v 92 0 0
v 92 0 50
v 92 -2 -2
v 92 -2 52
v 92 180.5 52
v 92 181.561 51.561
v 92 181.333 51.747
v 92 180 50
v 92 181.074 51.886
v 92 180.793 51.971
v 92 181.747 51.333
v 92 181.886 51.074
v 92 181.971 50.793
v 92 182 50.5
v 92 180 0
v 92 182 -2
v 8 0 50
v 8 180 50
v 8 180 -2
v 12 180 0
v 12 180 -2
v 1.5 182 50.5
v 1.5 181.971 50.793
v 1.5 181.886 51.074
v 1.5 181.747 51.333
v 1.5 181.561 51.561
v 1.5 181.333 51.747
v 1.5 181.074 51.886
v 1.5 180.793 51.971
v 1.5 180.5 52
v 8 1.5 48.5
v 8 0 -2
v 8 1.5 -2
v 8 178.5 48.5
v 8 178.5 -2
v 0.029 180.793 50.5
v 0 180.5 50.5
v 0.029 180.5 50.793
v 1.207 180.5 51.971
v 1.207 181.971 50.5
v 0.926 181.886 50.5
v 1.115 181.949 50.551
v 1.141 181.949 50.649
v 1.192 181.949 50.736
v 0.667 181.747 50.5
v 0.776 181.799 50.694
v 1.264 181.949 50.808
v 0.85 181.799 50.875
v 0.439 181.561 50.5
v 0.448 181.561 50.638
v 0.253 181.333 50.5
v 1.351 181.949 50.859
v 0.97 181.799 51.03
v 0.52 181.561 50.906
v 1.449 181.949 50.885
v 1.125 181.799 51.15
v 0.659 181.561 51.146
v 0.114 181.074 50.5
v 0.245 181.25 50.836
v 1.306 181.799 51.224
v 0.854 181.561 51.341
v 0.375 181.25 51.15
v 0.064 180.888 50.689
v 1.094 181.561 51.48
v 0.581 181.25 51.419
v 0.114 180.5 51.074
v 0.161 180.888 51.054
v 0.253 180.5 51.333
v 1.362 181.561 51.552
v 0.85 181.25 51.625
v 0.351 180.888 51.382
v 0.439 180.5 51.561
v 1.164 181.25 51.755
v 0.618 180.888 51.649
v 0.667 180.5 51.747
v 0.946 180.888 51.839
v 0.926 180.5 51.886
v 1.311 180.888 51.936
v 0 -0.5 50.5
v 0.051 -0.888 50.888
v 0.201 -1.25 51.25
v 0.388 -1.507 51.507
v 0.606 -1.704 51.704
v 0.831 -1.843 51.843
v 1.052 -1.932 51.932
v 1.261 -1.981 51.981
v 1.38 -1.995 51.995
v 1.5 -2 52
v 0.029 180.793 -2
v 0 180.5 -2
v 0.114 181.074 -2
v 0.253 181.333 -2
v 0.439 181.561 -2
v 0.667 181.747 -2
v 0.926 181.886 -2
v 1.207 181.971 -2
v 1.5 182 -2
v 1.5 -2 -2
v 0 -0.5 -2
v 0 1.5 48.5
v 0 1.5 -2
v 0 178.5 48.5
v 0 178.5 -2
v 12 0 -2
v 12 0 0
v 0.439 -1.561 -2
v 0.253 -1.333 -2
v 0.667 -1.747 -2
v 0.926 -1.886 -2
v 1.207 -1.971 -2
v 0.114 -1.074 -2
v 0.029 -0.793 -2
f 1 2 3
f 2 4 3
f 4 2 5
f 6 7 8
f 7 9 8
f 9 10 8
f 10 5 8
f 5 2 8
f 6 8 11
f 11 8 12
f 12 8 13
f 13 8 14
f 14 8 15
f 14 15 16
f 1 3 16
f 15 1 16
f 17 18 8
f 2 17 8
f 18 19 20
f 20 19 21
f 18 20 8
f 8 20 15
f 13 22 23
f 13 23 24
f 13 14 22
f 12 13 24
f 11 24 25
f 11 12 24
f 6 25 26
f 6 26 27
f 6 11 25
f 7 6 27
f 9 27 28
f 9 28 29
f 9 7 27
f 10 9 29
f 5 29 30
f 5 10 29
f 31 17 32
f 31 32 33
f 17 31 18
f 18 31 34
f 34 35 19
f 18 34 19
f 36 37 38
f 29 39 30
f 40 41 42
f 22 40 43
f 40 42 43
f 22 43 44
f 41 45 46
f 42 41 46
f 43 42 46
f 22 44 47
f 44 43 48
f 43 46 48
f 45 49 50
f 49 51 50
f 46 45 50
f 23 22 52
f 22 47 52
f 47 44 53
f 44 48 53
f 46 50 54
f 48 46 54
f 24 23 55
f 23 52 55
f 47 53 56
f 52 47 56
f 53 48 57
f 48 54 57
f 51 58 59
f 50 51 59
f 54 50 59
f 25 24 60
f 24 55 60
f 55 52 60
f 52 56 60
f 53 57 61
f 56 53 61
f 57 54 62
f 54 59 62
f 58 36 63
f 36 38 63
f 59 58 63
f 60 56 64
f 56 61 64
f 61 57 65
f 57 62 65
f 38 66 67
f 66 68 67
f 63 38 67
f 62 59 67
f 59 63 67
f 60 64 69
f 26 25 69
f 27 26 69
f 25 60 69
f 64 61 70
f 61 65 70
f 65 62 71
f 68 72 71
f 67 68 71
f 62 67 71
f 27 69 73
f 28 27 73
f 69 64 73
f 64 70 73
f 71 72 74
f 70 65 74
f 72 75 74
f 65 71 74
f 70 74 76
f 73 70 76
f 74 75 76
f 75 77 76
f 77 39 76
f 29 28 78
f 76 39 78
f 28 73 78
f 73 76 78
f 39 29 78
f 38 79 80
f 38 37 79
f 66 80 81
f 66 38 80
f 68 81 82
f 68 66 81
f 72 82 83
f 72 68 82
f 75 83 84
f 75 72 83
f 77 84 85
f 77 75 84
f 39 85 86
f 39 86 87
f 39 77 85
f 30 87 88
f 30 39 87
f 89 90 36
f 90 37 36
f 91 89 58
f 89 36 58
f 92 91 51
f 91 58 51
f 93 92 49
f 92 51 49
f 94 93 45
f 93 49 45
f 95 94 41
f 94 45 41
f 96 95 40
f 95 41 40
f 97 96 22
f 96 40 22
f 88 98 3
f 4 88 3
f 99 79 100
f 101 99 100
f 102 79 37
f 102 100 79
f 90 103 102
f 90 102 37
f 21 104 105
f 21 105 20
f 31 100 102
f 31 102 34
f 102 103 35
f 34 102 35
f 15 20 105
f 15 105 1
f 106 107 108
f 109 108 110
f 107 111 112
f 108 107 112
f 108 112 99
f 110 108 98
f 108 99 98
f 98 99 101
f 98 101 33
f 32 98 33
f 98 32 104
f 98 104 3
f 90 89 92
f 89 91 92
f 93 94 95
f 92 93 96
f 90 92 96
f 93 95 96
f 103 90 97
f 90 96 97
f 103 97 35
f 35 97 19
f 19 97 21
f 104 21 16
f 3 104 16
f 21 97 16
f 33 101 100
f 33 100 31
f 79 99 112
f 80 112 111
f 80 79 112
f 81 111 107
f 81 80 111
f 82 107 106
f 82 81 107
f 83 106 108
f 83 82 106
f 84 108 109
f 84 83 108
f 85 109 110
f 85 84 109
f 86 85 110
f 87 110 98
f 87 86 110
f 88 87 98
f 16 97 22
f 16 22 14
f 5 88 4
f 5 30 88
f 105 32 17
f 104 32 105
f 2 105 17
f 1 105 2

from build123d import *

# Parameters (mm, degrees)
BOX003_W     = 8
BOX003_H     = 180
BOX003_DEPTH = 1.5
BOX004_W     = 8
BOX004_H     = 1.5
BOX004_DEPTH = 52
BOX005_W     = 8
BOX005_H     = 1.5
BOX005_DEPTH = 52
BOX002_W     = 12
BOX002_H     = 180
BOX002_DEPTH = 52
BOX_W        = 160
BOX_H        = 180
BOX_DEPTH    = 50
BOX001_W     = 92
BOX001_H     = 184
BOX001_DEPTH = 54
FILLET_R     = 1.5


with BuildPart() as cube003:
    # Box003 → Box003 (new body)
    with BuildSketch(Plane.XY.offset(48.5)):
        with Locations((4, 90)):
            Rectangle(BOX003_W, BOX003_H)
    extrude(amount=BOX003_DEPTH)


with BuildPart() as cube004:
    # Box004 → Box004 (new body)
    with BuildSketch(Plane.XY.offset(-2)):
        with Locations((4, 0.75)):
            Rectangle(BOX004_W, BOX004_H)
    extrude(amount=BOX004_DEPTH)


with BuildPart() as cube005:
    # Box005 → Box005 (new body)
    with BuildSketch(Plane(origin=(0, 178.5, -2), x_dir=(1, 0, 0), z_dir=(0, 0, 1))):
        with Locations((4, 0.75)):
            Rectangle(BOX005_W, BOX005_H)
    extrude(amount=BOX005_DEPTH)


with BuildPart() as cube002:
    # Box002 → Box002 (new body)
    with BuildSketch(Plane.XY.offset(-20)):
        with Locations((6, 90)):
            Rectangle(BOX002_W, BOX002_H)
    extrude(amount=BOX002_DEPTH)


with BuildPart() as cube:
    # Box → Box (new body)
    with BuildSketch(Plane.XY):
        with Locations((80, 90)):
            Rectangle(BOX_W, BOX_H)
    extrude(amount=BOX_DEPTH)


with BuildPart() as draft:
    # Box001 → Box001 (new body)
    with BuildSketch(Plane(origin=(0, -2, -2), x_dir=(1, 0, 0), z_dir=(0, 0, 1))):
        with Locations((46, 92)):
            Rectangle(BOX001_W, BOX001_H)
    extrude(amount=BOX001_DEPTH)

    # Cut: cut Cube
    add(cube.part, mode=Mode.SUBTRACT)

    # Cut001: cut Cube002
    add(cube002.part, mode=Mode.SUBTRACT)

    # Fusion: union Cube003, Cube004, Cube005
    add(cube003.part)
    add(cube004.part)
    add(cube005.part)

    # Fillet
    fillet_edges = [draft.edges().sort_by_distance(p)[0] for p in [
        (0, 90, 52),
        (0, 182, 25),
        (0, -2, 25),
        (46, 182, 52),
    ]]
    fillet(fillet_edges, radius=FILLET_R)


solid = draft.part
